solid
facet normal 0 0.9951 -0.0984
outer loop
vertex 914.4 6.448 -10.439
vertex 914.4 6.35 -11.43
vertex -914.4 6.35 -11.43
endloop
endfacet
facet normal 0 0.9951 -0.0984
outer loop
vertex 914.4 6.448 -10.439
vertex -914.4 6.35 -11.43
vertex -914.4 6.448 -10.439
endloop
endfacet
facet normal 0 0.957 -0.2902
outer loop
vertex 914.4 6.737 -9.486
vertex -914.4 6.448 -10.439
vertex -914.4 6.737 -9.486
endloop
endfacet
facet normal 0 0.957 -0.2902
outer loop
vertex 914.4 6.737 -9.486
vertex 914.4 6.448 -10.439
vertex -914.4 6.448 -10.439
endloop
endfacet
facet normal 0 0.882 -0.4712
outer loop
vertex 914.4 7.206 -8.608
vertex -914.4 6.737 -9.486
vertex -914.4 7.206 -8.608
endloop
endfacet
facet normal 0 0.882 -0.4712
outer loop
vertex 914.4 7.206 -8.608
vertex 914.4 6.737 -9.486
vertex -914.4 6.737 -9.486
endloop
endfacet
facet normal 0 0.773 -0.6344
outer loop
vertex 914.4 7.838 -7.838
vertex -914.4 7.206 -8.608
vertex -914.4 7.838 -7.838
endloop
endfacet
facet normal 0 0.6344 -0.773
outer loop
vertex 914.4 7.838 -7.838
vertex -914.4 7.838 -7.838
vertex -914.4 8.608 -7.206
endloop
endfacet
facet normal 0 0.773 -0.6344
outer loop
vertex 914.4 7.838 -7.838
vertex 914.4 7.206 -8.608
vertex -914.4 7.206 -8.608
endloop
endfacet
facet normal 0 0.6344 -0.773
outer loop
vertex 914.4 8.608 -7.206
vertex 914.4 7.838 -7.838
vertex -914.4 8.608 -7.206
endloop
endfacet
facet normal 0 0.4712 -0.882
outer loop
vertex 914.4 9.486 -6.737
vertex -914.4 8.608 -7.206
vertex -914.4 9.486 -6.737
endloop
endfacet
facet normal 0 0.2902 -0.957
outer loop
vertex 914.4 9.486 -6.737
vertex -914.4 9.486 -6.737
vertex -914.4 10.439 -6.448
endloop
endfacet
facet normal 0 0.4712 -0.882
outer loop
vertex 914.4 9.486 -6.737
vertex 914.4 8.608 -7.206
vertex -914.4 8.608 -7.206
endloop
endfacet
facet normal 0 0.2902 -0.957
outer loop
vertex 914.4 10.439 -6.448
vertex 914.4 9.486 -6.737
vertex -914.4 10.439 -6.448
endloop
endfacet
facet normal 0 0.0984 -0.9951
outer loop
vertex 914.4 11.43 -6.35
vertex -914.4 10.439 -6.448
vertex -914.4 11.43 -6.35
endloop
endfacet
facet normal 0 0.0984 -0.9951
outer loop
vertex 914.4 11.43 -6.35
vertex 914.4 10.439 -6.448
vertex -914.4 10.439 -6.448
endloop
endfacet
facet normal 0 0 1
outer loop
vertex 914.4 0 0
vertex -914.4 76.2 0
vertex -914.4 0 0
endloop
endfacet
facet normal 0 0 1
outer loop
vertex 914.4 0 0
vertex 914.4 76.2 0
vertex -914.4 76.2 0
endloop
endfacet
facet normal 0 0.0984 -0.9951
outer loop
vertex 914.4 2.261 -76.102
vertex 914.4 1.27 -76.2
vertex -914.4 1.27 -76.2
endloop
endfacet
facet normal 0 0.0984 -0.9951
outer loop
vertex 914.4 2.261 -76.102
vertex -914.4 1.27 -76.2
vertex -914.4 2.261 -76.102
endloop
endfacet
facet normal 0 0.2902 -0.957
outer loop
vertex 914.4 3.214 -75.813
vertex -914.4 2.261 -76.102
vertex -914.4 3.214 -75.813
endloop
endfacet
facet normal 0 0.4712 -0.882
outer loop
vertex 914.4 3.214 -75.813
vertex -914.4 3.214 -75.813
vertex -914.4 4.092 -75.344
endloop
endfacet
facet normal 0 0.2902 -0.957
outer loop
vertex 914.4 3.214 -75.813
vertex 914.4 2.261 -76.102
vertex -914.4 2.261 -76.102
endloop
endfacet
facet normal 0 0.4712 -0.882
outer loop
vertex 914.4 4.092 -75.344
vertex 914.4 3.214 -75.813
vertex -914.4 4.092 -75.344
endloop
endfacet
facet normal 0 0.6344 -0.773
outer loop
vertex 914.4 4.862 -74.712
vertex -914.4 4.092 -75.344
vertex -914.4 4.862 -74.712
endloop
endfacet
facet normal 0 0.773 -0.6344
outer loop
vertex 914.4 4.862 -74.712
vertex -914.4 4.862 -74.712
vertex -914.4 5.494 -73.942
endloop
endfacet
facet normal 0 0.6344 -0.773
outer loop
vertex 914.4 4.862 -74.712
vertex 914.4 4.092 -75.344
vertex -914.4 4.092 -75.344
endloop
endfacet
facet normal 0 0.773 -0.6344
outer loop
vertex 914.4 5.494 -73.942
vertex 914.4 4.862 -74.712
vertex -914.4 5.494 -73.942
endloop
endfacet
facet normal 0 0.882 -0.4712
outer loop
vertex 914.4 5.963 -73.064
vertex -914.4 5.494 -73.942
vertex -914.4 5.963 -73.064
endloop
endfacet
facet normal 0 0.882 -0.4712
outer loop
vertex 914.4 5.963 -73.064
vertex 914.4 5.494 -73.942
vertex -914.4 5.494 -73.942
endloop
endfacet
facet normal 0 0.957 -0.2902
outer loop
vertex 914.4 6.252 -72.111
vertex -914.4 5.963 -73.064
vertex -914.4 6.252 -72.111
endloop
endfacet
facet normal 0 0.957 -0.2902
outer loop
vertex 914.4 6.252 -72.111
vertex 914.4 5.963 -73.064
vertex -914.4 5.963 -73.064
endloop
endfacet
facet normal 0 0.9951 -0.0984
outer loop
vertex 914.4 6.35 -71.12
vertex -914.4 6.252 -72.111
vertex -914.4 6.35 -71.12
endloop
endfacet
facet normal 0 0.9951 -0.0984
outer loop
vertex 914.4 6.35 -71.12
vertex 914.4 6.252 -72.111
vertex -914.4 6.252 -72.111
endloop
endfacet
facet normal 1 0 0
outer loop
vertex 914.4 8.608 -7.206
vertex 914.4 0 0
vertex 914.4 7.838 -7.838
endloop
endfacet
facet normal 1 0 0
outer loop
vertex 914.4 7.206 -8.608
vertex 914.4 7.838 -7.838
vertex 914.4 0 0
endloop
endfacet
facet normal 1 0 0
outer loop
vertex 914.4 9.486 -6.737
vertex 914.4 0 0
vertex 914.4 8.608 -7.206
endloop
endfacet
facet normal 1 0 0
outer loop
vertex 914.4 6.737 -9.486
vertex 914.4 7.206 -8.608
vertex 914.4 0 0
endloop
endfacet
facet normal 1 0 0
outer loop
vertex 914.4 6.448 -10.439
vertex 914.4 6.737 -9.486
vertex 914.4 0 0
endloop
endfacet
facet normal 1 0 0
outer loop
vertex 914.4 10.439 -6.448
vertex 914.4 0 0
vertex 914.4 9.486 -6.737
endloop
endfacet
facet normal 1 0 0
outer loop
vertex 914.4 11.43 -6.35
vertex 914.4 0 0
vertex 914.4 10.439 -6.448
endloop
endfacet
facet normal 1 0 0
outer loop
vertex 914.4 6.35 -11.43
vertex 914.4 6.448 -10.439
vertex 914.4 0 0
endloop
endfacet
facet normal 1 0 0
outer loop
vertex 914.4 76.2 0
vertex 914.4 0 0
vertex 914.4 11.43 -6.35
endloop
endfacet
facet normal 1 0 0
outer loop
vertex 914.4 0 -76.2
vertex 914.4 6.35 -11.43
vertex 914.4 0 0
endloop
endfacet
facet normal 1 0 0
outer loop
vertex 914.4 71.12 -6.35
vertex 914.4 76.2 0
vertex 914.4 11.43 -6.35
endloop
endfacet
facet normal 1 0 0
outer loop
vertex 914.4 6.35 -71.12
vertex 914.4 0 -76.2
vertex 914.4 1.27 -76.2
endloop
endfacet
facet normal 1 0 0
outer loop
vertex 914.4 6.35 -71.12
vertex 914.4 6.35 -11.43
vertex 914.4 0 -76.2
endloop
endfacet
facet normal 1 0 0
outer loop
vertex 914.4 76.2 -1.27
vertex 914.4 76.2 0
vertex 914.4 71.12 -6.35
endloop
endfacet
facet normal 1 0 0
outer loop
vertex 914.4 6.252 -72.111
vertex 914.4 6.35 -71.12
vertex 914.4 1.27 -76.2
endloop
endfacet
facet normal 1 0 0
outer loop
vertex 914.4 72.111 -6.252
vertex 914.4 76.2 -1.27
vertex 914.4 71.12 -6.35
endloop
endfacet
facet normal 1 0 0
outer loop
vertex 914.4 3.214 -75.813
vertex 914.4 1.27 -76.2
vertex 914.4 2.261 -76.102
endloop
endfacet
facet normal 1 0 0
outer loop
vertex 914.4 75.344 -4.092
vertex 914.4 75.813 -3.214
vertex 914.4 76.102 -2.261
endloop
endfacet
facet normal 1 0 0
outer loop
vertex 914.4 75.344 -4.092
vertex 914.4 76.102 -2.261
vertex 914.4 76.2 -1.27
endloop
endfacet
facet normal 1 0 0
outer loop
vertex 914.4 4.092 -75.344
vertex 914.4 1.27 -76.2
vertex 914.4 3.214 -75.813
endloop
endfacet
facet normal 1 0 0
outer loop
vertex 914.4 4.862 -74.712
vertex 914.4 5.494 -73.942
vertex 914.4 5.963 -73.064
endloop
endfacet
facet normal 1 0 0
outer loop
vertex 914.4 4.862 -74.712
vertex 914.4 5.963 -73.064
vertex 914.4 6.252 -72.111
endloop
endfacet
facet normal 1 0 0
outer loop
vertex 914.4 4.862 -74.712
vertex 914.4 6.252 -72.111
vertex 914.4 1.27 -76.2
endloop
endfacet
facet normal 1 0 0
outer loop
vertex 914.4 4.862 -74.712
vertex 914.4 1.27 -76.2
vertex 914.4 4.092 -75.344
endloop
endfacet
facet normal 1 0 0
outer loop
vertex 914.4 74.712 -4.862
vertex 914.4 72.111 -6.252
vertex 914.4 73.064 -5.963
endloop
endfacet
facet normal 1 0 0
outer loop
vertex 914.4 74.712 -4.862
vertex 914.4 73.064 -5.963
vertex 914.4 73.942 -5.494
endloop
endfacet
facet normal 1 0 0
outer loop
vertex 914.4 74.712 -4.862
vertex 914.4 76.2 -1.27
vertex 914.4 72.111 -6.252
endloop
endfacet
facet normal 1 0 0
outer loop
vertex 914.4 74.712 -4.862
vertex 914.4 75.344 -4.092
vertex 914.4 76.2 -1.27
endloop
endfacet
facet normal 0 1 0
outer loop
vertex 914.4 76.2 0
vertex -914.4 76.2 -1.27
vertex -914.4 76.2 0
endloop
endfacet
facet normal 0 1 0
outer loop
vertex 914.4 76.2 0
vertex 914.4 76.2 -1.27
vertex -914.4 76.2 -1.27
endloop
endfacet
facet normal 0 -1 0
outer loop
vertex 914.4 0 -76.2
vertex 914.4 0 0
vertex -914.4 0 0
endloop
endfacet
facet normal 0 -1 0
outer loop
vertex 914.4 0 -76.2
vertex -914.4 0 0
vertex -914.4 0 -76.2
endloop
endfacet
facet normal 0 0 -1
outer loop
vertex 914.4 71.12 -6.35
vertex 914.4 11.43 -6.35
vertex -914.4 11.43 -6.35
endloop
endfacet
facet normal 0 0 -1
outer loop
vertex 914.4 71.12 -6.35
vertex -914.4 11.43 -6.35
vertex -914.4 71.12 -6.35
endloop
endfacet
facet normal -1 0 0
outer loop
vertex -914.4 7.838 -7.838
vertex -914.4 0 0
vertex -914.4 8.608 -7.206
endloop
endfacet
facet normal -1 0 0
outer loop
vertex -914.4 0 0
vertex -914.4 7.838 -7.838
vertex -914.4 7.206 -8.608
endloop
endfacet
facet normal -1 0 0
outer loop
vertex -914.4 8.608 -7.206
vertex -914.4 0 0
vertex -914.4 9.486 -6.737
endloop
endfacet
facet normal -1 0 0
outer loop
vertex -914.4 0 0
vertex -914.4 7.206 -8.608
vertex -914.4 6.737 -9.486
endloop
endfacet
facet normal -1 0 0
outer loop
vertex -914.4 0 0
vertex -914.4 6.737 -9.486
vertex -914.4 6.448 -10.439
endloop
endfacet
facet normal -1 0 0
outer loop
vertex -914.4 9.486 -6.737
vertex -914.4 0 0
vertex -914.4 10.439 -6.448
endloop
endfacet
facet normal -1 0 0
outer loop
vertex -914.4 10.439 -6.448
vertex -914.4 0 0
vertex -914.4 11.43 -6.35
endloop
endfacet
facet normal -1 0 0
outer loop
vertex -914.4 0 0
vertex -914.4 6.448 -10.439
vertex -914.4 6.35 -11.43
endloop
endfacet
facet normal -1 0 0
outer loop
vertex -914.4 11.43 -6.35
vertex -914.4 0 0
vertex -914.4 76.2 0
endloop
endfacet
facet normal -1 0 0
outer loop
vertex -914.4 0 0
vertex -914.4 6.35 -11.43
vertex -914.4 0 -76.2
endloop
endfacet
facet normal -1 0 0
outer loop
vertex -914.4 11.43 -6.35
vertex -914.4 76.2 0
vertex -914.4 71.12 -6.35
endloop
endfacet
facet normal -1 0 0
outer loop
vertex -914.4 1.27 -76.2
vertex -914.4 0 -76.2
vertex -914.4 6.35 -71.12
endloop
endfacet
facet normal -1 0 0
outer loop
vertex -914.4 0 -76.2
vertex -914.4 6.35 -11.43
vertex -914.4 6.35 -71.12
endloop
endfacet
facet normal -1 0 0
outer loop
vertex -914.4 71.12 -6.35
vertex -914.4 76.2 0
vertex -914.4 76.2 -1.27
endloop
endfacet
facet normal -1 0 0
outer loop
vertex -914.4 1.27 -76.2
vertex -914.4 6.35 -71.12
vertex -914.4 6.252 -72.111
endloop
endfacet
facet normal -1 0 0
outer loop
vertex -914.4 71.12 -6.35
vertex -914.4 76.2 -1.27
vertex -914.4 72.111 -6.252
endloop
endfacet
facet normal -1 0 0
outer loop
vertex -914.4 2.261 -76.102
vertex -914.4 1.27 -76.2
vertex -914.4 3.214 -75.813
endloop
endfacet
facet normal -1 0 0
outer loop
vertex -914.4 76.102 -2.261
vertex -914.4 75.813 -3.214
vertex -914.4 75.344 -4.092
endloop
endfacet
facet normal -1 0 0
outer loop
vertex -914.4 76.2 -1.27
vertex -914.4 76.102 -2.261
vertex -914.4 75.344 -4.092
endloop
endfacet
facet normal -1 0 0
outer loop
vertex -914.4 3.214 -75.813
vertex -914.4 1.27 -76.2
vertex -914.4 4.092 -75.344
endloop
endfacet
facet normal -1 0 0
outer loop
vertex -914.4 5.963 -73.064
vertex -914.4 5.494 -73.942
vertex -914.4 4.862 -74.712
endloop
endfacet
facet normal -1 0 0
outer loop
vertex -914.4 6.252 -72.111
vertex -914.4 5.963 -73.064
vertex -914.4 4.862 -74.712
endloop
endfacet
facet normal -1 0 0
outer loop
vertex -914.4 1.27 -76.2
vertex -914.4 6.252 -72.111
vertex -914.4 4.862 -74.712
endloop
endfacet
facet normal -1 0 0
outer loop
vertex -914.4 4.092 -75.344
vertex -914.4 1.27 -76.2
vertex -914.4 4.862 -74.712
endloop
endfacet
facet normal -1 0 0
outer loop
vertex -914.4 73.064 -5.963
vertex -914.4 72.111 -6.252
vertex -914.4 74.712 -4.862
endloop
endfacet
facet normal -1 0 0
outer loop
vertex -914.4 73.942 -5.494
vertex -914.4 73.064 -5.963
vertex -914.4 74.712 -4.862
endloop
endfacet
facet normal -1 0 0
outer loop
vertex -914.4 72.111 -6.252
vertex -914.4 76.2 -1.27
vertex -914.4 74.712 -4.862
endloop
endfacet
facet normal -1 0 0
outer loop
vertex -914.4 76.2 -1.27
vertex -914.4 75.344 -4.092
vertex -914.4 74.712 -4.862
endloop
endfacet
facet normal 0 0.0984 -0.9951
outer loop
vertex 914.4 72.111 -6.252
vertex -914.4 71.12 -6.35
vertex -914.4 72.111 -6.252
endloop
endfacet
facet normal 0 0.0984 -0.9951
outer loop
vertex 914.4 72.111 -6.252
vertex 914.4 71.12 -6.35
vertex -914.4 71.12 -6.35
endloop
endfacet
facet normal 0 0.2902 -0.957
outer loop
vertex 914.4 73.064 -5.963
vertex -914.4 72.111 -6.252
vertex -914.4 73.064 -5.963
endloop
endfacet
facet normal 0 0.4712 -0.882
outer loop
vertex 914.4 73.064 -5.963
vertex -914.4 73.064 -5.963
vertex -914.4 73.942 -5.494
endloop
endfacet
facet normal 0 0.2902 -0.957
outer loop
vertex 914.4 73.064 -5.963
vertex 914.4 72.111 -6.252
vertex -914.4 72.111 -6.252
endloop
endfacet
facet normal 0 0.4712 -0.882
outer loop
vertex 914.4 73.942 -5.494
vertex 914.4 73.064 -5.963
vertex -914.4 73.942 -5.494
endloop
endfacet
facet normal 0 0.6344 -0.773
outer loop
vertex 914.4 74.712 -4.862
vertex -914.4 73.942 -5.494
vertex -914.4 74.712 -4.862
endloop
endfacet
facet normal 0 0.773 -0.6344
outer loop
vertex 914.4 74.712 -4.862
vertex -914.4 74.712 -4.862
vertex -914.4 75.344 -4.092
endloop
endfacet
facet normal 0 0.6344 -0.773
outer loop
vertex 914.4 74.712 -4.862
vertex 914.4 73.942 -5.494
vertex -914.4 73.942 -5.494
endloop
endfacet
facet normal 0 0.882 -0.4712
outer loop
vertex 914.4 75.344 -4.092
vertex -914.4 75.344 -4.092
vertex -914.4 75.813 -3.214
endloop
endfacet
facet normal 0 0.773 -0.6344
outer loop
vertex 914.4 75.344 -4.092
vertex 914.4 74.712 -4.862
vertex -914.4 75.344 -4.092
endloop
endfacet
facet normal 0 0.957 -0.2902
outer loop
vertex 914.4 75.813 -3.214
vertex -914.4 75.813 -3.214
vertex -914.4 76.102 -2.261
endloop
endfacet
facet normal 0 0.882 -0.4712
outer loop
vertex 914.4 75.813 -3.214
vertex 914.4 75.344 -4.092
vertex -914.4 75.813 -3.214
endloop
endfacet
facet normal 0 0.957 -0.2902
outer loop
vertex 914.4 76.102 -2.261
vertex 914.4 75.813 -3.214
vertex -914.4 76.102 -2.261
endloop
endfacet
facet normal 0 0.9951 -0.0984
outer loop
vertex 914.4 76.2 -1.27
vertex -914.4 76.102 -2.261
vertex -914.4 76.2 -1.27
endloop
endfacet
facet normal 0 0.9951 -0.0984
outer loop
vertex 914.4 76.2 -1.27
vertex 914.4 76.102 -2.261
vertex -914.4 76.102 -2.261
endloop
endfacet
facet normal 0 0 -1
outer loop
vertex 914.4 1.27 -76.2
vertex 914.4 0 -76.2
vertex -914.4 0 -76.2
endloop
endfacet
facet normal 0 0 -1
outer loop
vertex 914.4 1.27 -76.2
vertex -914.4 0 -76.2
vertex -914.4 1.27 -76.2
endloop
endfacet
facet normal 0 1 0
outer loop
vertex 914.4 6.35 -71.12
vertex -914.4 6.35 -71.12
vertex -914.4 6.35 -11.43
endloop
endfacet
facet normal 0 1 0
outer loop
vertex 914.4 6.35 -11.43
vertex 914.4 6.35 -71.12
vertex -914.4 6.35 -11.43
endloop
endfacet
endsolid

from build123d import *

# Parameters (mm, degrees)
BOSS_EXTRUDE1_DEPTH      = 914.4
BOSS_EXTRUDE1_DEPTH_BACK = 914.4


with BuildPart() as part:
    # Sketch1 → Boss-Extrude1 (new body, two sides)
    with BuildSketch(Plane(origin=(0, 0, 0), x_dir=(0, 0, -1), z_dir=(1, 0, 0))) as boss_extrude1_sk:
        with BuildLine():
            Line((0, 76.2), (0, 0))
            Line((0, 0), (76.2, 0))
            Line((76.2, 0), (76.2, 1.27))
            ThreePointArc((76.2, 1.27), (74.712102448, 4.862102448), (71.12, 6.35))
            Line((71.12, 6.35), (11.43, 6.35))
            ThreePointArc((11.43, 6.35), (7.837897552, 7.837897552), (6.35, 11.43))
            Line((6.35, 11.43), (6.35, 71.12))
            ThreePointArc((6.35, 71.12), (4.862102448, 74.712102448), (1.27, 76.2))
            Line((1.27, 76.2), (0, 76.2))
        make_face()
    extrude(amount=BOSS_EXTRUDE1_DEPTH)
    extrude(boss_extrude1_sk.sketch, amount=-BOSS_EXTRUDE1_DEPTH_BACK)


solid = part.part
